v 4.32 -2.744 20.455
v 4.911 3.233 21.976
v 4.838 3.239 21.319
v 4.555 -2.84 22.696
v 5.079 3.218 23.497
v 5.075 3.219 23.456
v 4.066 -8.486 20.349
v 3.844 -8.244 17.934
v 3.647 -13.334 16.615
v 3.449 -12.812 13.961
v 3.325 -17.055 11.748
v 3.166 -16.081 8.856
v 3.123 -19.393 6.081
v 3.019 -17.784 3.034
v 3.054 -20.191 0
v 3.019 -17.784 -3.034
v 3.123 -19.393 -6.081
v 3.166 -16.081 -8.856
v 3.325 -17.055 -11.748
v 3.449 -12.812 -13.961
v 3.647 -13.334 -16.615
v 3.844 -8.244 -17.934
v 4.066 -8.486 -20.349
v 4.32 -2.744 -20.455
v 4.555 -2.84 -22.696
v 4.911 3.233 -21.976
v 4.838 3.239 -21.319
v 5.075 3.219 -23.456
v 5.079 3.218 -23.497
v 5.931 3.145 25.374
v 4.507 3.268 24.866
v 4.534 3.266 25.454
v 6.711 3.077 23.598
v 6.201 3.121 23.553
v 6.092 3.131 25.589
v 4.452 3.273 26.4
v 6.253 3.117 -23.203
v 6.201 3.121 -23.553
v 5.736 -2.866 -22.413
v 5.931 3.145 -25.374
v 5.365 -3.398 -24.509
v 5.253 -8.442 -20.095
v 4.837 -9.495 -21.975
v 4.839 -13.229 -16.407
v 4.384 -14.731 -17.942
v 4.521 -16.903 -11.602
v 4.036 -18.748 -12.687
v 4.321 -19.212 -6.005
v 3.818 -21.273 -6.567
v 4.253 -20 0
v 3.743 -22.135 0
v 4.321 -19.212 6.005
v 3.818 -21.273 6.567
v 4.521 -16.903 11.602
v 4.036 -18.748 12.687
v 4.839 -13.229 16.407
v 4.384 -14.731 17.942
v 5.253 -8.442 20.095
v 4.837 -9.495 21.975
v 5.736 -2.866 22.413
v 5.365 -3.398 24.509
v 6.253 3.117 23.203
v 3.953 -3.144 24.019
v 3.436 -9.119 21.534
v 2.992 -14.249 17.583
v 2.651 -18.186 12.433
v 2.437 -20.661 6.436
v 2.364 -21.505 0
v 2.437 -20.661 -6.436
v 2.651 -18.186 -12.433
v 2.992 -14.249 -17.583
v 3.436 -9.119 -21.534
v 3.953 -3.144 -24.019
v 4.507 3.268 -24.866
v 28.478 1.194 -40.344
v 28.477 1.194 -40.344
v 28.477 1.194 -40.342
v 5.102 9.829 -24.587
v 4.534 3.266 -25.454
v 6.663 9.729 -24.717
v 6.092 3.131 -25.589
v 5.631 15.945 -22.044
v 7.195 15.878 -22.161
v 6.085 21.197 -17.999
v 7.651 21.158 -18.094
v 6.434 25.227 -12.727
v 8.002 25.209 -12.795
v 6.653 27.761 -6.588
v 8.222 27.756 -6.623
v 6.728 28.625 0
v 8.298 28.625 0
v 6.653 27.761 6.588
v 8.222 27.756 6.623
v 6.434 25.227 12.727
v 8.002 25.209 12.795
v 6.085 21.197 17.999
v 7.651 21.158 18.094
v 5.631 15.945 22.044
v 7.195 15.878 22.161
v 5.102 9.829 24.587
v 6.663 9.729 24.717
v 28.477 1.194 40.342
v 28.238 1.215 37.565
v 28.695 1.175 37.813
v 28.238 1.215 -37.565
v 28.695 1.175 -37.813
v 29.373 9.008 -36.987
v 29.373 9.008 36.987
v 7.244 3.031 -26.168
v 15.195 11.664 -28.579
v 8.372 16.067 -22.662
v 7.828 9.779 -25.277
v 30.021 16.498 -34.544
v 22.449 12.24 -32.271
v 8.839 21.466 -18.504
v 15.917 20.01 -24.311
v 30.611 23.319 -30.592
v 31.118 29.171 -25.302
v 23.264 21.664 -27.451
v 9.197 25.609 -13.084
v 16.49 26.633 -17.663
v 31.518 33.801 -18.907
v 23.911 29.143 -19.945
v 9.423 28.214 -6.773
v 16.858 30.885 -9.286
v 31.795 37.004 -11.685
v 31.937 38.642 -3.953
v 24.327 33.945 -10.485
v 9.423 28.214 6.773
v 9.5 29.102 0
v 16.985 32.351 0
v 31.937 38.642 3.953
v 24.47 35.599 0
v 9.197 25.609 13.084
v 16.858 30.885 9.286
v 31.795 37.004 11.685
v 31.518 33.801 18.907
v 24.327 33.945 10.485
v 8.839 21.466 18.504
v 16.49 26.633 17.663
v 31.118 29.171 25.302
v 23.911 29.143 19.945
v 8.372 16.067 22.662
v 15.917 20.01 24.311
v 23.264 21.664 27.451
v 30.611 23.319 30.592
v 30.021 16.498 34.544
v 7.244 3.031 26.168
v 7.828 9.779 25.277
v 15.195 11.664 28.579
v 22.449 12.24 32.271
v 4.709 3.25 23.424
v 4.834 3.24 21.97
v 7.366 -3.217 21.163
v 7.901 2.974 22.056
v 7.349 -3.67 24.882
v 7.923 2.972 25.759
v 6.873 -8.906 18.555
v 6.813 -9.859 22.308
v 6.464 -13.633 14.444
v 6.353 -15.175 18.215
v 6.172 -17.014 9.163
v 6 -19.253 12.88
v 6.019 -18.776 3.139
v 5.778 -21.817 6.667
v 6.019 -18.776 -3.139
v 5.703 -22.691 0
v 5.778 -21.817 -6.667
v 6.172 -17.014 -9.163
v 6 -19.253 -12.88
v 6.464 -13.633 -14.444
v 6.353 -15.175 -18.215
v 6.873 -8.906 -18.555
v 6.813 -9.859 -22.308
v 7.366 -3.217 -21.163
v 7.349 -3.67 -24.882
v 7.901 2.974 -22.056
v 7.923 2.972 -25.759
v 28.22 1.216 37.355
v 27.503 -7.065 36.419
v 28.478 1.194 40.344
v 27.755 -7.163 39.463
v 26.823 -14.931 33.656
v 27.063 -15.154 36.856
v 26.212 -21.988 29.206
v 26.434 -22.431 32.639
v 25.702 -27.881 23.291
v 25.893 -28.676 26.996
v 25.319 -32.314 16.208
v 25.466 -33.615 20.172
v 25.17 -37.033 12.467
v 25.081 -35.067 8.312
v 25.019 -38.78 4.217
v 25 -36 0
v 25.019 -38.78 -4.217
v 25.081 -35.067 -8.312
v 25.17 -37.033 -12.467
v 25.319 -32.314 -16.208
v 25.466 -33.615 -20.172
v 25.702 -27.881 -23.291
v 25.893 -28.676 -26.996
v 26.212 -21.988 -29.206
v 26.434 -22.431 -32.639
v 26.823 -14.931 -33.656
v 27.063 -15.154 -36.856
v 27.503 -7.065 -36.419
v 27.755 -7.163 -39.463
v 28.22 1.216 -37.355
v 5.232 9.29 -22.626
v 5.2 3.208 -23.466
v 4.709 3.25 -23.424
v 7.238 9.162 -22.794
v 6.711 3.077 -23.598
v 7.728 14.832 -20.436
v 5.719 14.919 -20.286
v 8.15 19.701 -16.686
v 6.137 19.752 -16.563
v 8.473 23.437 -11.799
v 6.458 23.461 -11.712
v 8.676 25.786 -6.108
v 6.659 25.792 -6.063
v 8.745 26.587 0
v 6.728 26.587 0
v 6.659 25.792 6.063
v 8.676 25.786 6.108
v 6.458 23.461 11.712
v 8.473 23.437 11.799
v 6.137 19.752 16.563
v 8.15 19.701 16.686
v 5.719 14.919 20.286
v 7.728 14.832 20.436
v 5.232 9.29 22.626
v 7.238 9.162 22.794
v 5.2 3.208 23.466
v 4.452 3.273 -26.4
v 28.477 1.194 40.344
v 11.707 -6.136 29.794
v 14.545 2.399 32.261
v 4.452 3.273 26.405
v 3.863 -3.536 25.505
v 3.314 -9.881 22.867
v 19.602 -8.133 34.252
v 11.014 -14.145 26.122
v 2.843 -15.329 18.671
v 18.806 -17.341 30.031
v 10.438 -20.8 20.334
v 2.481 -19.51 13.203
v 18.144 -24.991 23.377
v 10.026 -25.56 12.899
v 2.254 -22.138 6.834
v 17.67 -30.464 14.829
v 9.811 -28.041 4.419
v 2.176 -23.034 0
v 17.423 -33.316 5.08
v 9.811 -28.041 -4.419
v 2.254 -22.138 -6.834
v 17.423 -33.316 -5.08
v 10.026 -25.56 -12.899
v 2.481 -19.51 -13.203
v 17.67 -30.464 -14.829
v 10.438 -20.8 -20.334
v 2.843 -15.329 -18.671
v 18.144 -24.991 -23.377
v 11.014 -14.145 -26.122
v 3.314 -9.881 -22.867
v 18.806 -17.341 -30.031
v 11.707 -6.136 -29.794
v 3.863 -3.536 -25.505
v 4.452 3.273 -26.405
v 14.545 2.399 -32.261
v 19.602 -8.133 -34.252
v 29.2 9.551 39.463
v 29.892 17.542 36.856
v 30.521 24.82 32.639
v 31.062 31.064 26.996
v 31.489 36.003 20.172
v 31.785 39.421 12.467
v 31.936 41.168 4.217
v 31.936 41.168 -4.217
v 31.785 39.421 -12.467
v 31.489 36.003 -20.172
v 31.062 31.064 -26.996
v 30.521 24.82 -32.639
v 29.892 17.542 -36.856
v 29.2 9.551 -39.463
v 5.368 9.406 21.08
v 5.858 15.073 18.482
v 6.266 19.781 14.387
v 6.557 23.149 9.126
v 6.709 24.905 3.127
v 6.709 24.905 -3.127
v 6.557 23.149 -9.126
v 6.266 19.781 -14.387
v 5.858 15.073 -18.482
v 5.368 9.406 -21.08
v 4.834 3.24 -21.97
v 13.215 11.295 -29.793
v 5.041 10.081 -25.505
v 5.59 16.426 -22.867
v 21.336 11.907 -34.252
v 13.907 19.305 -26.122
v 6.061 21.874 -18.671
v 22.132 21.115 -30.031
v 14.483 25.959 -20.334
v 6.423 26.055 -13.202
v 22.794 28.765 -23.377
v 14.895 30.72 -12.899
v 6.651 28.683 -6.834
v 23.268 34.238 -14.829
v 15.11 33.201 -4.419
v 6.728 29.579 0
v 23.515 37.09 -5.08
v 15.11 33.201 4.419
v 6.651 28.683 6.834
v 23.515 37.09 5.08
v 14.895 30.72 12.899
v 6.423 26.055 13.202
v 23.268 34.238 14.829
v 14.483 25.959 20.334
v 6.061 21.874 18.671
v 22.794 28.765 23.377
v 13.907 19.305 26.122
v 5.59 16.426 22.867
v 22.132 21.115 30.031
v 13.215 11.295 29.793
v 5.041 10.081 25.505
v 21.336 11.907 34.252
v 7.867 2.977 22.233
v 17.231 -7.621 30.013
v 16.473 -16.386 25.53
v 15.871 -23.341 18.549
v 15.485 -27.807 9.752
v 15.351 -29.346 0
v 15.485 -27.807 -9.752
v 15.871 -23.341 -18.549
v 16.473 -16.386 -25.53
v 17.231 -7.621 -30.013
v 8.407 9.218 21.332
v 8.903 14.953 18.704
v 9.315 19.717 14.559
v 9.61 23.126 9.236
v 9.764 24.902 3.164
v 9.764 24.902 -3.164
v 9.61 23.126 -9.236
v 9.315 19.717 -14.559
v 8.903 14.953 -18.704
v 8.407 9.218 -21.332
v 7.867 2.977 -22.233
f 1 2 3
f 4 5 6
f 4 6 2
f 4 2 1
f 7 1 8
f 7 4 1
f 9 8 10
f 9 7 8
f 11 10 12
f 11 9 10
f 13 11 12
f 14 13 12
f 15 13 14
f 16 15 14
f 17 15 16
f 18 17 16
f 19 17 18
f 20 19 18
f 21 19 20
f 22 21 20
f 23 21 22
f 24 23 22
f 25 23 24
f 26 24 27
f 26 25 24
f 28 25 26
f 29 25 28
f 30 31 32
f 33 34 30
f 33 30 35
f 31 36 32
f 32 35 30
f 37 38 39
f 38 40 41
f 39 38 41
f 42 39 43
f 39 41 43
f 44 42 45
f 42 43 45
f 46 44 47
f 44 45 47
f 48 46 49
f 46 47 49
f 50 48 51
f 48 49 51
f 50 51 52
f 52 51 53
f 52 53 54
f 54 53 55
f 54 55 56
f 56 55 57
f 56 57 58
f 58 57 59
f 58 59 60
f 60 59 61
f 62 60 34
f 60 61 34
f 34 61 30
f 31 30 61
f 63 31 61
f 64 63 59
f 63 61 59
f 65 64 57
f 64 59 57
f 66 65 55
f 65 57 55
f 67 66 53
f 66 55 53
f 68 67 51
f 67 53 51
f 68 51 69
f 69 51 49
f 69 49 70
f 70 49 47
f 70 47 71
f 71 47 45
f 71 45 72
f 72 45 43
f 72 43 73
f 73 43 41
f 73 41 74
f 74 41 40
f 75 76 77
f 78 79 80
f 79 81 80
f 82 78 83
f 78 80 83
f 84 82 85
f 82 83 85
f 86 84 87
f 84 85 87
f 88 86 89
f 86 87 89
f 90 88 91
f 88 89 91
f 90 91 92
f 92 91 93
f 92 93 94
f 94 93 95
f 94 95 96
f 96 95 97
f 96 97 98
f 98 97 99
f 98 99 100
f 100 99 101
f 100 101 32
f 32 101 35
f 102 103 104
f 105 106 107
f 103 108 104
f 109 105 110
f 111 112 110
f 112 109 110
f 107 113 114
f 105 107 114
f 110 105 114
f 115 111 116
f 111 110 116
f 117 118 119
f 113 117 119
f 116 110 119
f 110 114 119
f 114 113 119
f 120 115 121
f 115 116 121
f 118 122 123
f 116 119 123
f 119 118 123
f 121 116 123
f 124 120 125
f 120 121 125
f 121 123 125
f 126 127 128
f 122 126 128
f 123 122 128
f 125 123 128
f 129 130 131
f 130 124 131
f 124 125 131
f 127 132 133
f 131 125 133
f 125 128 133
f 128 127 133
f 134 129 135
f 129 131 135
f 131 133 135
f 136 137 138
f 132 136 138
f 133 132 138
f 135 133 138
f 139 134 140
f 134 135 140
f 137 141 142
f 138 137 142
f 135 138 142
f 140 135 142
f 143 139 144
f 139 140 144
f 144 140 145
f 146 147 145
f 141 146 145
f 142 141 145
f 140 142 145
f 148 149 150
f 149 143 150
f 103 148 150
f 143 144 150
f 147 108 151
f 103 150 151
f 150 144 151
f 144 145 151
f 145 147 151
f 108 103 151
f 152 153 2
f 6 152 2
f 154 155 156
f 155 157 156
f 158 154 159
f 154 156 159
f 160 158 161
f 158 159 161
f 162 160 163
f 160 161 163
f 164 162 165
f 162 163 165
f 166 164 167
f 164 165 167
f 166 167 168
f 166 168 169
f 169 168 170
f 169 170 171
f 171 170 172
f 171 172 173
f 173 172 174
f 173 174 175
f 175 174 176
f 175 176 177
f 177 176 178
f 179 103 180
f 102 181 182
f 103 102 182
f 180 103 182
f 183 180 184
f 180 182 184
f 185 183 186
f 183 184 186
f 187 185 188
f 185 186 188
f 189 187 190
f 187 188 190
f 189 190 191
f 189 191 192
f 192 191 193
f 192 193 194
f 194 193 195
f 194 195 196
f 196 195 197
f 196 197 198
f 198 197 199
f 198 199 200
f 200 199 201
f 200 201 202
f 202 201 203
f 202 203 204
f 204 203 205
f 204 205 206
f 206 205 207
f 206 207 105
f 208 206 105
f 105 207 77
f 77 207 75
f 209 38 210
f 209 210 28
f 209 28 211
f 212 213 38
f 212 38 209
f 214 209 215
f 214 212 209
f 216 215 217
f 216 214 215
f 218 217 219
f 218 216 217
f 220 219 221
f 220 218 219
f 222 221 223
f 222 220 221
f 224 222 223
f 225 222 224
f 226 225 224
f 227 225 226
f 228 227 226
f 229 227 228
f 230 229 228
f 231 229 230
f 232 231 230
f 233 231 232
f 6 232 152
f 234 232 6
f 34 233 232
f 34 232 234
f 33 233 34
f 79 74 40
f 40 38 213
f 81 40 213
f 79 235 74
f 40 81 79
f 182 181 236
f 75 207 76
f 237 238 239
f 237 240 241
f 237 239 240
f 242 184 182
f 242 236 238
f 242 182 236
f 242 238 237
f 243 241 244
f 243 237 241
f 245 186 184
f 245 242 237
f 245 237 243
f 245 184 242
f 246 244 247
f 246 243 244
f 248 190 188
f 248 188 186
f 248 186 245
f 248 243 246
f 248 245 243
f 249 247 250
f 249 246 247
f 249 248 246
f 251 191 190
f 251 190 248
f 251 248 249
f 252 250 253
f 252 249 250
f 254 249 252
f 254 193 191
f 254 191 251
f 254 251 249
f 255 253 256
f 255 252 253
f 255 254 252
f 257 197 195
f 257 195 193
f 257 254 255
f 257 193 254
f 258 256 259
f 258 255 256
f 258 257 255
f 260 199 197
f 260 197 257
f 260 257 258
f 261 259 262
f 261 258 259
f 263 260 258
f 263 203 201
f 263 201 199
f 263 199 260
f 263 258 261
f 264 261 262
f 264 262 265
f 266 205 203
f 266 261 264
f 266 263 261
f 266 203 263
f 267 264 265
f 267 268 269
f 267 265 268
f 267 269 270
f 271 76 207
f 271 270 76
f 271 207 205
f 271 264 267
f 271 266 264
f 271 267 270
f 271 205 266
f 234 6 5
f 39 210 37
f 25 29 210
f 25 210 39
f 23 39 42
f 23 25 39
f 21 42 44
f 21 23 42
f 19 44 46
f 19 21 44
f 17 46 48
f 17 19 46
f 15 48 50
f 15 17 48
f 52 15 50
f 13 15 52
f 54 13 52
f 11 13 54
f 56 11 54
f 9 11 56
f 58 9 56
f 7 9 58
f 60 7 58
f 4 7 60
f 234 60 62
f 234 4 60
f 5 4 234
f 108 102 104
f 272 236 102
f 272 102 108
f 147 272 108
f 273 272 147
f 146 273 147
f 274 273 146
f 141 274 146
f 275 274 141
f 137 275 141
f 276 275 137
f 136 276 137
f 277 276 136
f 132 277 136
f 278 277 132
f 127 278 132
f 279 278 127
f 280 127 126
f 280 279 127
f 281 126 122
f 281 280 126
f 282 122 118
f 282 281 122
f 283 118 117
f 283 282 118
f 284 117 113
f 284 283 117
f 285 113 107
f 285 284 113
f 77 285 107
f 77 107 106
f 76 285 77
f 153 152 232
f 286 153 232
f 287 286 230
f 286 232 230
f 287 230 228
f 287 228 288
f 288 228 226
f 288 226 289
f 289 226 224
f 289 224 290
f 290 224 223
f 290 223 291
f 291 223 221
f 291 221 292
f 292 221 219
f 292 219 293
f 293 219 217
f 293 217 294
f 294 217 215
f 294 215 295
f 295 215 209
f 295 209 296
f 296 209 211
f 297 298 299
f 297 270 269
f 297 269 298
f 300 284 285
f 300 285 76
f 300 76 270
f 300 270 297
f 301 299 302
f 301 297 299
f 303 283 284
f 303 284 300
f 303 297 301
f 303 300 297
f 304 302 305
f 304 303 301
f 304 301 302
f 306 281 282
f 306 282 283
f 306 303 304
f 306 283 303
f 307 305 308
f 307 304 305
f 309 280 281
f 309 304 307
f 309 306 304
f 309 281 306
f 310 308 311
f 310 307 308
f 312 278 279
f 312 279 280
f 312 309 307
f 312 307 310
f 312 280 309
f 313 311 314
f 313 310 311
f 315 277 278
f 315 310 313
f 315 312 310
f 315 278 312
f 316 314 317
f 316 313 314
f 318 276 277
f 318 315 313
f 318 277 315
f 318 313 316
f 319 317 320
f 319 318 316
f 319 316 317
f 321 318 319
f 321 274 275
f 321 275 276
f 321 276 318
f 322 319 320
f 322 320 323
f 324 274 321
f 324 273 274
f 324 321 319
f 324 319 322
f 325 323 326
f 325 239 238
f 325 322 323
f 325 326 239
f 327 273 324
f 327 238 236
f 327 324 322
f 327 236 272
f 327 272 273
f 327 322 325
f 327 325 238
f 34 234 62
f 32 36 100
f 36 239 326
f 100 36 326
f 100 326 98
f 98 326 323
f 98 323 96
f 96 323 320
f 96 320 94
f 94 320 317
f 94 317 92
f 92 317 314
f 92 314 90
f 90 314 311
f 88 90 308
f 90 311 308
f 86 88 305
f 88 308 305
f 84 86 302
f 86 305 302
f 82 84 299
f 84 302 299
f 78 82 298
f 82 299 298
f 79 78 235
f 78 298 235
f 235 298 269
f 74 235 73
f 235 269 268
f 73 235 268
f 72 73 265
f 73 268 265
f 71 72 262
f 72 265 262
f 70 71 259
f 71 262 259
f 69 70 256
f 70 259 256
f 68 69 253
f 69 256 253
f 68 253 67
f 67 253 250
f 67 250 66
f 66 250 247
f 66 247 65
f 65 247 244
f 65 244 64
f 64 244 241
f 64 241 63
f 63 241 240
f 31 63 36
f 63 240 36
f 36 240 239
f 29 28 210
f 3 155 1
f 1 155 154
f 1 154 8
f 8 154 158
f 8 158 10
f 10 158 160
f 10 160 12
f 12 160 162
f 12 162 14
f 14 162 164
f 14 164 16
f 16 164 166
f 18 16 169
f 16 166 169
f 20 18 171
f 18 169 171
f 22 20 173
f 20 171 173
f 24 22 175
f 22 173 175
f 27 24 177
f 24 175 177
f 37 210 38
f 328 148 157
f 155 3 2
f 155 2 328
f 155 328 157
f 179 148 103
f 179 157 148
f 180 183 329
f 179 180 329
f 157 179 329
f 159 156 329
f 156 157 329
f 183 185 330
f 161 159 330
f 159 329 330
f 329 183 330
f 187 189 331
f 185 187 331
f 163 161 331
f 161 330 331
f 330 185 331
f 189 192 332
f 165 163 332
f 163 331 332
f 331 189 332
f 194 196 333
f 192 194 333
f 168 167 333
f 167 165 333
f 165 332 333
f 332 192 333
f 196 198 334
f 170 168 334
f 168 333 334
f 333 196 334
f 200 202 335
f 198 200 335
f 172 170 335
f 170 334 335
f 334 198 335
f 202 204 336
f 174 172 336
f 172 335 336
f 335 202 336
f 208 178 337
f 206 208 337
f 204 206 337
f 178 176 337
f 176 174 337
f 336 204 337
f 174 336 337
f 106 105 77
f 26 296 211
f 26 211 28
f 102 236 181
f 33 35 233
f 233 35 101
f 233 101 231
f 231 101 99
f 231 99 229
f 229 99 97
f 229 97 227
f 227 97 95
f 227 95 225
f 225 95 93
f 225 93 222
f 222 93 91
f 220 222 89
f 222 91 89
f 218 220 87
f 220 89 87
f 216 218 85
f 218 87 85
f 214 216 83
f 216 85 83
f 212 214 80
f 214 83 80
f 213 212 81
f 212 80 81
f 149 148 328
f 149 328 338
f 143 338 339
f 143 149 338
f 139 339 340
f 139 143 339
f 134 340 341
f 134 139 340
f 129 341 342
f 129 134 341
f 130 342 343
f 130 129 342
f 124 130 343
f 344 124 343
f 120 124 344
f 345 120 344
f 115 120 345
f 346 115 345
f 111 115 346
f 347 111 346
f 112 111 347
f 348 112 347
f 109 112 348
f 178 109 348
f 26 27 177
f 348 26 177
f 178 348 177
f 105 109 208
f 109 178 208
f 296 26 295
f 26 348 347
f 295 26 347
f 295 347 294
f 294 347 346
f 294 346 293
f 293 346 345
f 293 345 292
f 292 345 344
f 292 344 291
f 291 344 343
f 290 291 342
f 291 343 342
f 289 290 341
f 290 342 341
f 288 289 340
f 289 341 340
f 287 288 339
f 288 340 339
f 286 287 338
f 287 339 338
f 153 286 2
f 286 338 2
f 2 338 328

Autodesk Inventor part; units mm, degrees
ref_plane "YZ Plane" through (0, 0, 0) normal (1, 0, 0) x (0, 1, 0)
ref_plane "XZ Plane" through (0, 0, 0) normal (0, 1, 0) x (-1, 0, 0)
ref_plane "XY Plane" through (0, 0, 0) normal (0, 0, 1) x (1, 0, 0)
sketch "Sketch1" plane through (0, 0, 0) normal (1, 0, 0) x (0, 1, 0)
  arc A0 (6, 5) -> (0, 6.4776) centre (1.5083, -0.3184) ccw
  arc A1 (0, 6.4776) -> (-6, 2) centre (-0.0372, 0.2686) ccw
  arc A2 (-6, 2) -> (-5, -3.4628) centre (-1.5043, 0) ccw
  arc A3 (-5, -3.4628) -> (2, -5.5969) centre (1.6627, 5.8444) ccw
  arc A4 (2, -5.5969) -> (6.9353, -3.4628) centre (1.5482, 2.2219) ccw
  arc A5 (6, 5) -> (13, 1) centre (22.0402, 24.9454) ccw
  arc A6 (13, -1) -> (6.9353, -3.4628) centre (16.5953, -18.5517) ccw
  arc A7 (13, -1) -> (13, 1) centre (11.912, 0) ccw
  arc A8 (15.1251, -1.2068) -> (15.1251, 1.1192) centre (13.8597, -0.0438) ccw
  arc A9 (6.9841, 5.7712) -> (15.1251, 1.1192) centre (25.6388, 28.9677) ccw
  arc A10 (6.9841, 5.7712) -> (0.0061, 7.4897) centre (1.7602, -0.414) ccw
  arc A11 (0.0061, 7.4897) -> (-6.9719, 2.2822) centre (-0.0372, 0.2686) ccw
  arc A12 (-6.9719, 2.2822) -> (-5.8089, -4.0711) centre (-1.7435, -0.0438) ccw
  arc A13 (-5.8089, -4.0711) -> (2.3321, -6.5529) centre (1.9397, 6.7532) ccw
  arc A14 (2.3321, -6.5529) -> (8.0718, -4.0711) centre (1.8067, 2.5403) ccw
  arc A15 (15.1251, -1.2068) -> (8.0718, -4.0711) centre (19.3063, -21.6193) ccw
  point P0 (0, 0)
sketch "Sketch2" plane through (0, 0, 0) normal (0, 0, 1) x (1, 0, 0)
  arc A0 (4.5893, 15.6275) -> (5.3653, 12.7341) centre (8.4769, 15.1194) ccw
  arc A1 (7.1334, 6.0475) -> (5.3653, 12.7341) centre (-9.3019, 5.2787) ccw
  arc A2 (4, -1) -> (7.1334, 6.0475) centre (-2.3212, 6.0308) ccw
  arc A3 (4, -1) -> (2.2783, -7.605) centre (15.174, -7.4395) ccw
  arc A4 (4.5893, 15.6275) -> (-5.4042, 15.6275) centre (-0.4074, 13.9881) ccw
  arc A5 (-4.7137, -7.4395) -> (2.2783, -7.605) centre (-1.0169, 0.9638) ccw
  arc A6 (-5.4042, 15.6275) -> (-4.7137, -7.4395) centre (15.8945, 4.7212) ccw
  point P0 (0, 0)
  point P1 (16.0644, 6.0537)
sketch "Sketch3" plane through (0, 0, 0) normal (0, 0, 1) x (1, 0, 0)
  line L0 (8, 6) -> (8, -9.7213)
  line L1 (8, 6) -> (8, 19.0901)
  arc A0 (8, -9.7213) -> (8, 19.0901) centre (-3.1204, 4.6844) ccw
  point P0 (0, 0)
sketch "Sketch4" plane through (0, 0, 0) normal (0, 0, 1) x (1, 0, 0)
  arc A0 (4, -3) -> (3, -7.466) centre (10.199, -6.733) ccw
  arc A1 (4, -3) -> (7.6292, 3.7812) centre (-12.6955, 10.297) ccw
  arc A2 (7.6292, 3.7812) -> (7, 11) centre (-7.2238, 6.1234) ccw
  arc A3 (7, 11) -> (6.1482, 13) centre (-7.2238, 6.1234) ccw
  arc A4 (5.3976, 15.5783) -> (6.1482, 13) centre (8.6756, 15.1342) ccw
  arc A5 (3, -7.466) -> (9, -9) centre (8, -0.4104) ccw
  arc A6 (11, 18) -> (5.3976, 15.5783) centre (10.5, 11.4654) ccw
  arc A7 (9, -9) -> (11, 18) centre (-69.2967, 10.3738) ccw
  point P0 (0, 0)
sketch "Sketch5" plane through (0, 0, 0) normal (1, 0, 0) x (0, 1, 0)
  arc A0 (13, -1.7602) -> (13, 2.0171) centre (12.6189, 0.1284) ccw
  arc A1 (17, 0) -> (13, 2.0171) centre (12.9569, -3.0431) ccw
  arc A2 (13, -1.7602) -> (17, 0) centre (13.7728, 1.9087) ccw
  point P0 (0, 0)
sketch "Sketch7" plane through (0, 0, 0) normal (1, 0, 0) x (0, 1, 0)
  circle A0 centre (5, 0.3375) radius 25
  point P0 (0, 0)
  dimension "d10" = 50
sketch "Sketch8" plane through (0, 0, 0) normal (0, 0, 1) x (1, 0, 0)
  arc A0 (4.5893, 15.6275) -> (5.3653, 12.7341) centre (8.4769, 15.1194) ccw
  arc A1 (7.1334, 6.0475) -> (5.3653, 12.7341) centre (-9.3019, 5.2787) ccw
  arc A2 (4, -1) -> (7.1334, 6.0475) centre (-2.3212, 6.0308) ccw
  arc A3 (4, -1) -> (2.2783, -7.605) centre (15.174, -7.4395) ccw
  arc A4 (4.5893, 15.6275) -> (-5.4042, 15.6275) centre (-0.4074, 13.9881) ccw
  arc A5 (-4.7137, -7.4395) -> (2.2783, -7.605) centre (-1.0169, 0.9638) ccw
  arc A6 (-5.4042, 15.6275) -> (-4.7137, -7.4395) centre (15.8945, 4.7212) ccw
  point P0 (0, 0)
sketch "Sketch9" plane through (0, 0, 0) normal (0, 0, 1) x (1, 0, 0)
  line L0 (2.2936, -15.8564) -> (2.2936, -6.8564)
  arc A0 (2.2936, -6.8564) -> (-3.9962, -9.9765) centre (0.2723, -10.6815) ccw
  arc A1 (-4, -16) -> (2.2936, -15.8564) centre (-0.9465, -11.8394) ccw
  arc A2 (-3.9962, -9.9765) -> (-4, -16) centre (14.3076, -12.9998) ccw
  point P0 (0, 0)
sketch "Sketch10" plane through (0, 0, 0) normal (1, 0, 0) x (0, 1, 0)
  arc A0 (13, -1) -> (13, 1) centre (11.912, 0) ccw
  arc A1 (6, 5) -> (13, 1) centre (22.0402, 24.9454) ccw
  arc A2 (6, 5) -> (0, 6.4776) centre (1.5083, -0.3184) ccw
  arc A3 (0, 6.4776) -> (-6, 2) centre (-0.0372, 0.2686) ccw
  arc A4 (-6, 2) -> (-5, -3.4628) centre (-1.5043, 0) ccw
  arc A5 (-5, -3.4628) -> (2, -5.5969) centre (1.6627, 5.8444) ccw
  arc A6 (2, -5.5969) -> (6.9353, -3.4628) centre (1.5482, 2.2219) ccw
  arc A7 (13, -1) -> (6.9353, -3.4628) centre (16.5953, -18.5517) ccw
  point P0 (0, 0)
sketch "Sketch11" plane through (0, 0, 0) normal (0, 0, 1) x (1, 0, 0)
  arc A0 (4, -3) -> (3, -7.466) centre (10.199, -6.733) ccw
  arc A1 (4, -3) -> (7.6292, 3.7812) centre (-12.6955, 10.297) ccw
  arc A2 (7.6292, 3.7812) -> (7, 11) centre (-7.2238, 6.1234) ccw
  arc A3 (7, 11) -> (6.1482, 13) centre (-7.2238, 6.1234) ccw
  arc A4 (5.3976, 15.5783) -> (6.1482, 13) centre (8.6756, 15.1342) ccw
  arc A5 (11, -15) -> (11, 18) centre (-58.5, 1.5) ccw
  arc A6 (3, -7.466) -> (3.1376, -15) centre (85.1776, -9.733) ccw
  arc A7 (6, 24) -> (5.3976, 15.5783) centre (36.0186, 17.6203) ccw
  arc A8 (11, 18) -> (6, 24) centre (2.7033, 16.1694) ccw
  arc A9 (3.1376, -15) -> (11, -15) centre (7.0688, -10.5838) ccw
  arc A10 (5, 24) -> (4.5969, 15.5783) centre (45.756, 17.829) ccw
  arc A11 (-2, 19) -> (4.5969, 15.5783) centre (5.6189, 25.6189) ccw
  arc A12 (5, 24) -> (-2, 19) centre (11.5, 7.5) ccw
  point P0 (0, 0)
sketch "Sketch12" plane through (0, 0, 0) normal (1, 0, 0) x (0, 1, 0)
  circle A0 centre (3, 0.2318) radius 20
  circle A1 centre (3, 0.2318) radius 19
  point P0 (0, 0)
  dimension "d21" = 40
  dimension "d22" = 38
sketch "Sketch13" plane through (0, 0, 0) normal (0, 0, 1) x (1, 0, 0)
  arc A0 (4.6444, -3) -> (3.6444, -7.466) centre (10.8434, -6.733) ccw
  arc A1 (4.6444, -3) -> (8.2736, 3.7812) centre (-12.0511, 10.297) ccw
  arc A2 (8.2736, 3.7812) -> (7.6444, 11) centre (-6.5793, 6.1234) ccw
  arc A3 (7.6444, 11) -> (6.7926, 13) centre (-6.5793, 6.1234) ccw
  arc A4 (6.042, 15.5783) -> (6.7926, 13) centre (9.3201, 15.1342) ccw
  arc A5 (12.1446, -13.3563) -> (11.6094, 18.8213) centre (-67.1488, 1.418) ccw
  arc A6 (4.5893, 15.6275) -> (5.3653, 12.7341) centre (8.4769, 15.1194) ccw
  arc A7 (7.1334, 6.0475) -> (5.3653, 12.7341) centre (-9.3019, 5.2787) ccw
  arc A8 (4, -1) -> (7.1334, 6.0475) centre (-2.3212, 6.0308) ccw
  arc A9 (4, -1) -> (2.2783, -7.605) centre (15.174, -7.4395) ccw
  arc A10 (-5.4042, 15.6275) -> (-4.7137, -7.4395) centre (15.8945, 4.7212) ccw
  arc A11 (3.6444, -7.466) -> (4.6444, -19) centre (48.1921, -9.4141) ccw
  arc A12 (1, -17) -> (2.2783, -7.605) centre (-20.1318, -9.3402) ccw
  arc A13 (4.5893, 15.6275) -> (4, 28) centre (-90.183, 17.3138) ccw
  arc A14 (6.0097, 28) -> (6.042, 15.5783) centre (472.3708, 23) ccw
  arc A15 (4.6444, -19) -> (12.1446, -13.3563) centre (5.8088, -12.7419) ccw
  arc A16 (11.6094, 18.8213) -> (6.0097, 28) centre (-7.4499, 13.4913) ccw
  arc A17 (-4.7137, -7.4395) -> (1, -17) centre (32.2099, 8.14) ccw
  arc A18 (4, 28) -> (-5.4042, 15.6275) centre (39.2165, -8.5279) ccw
  point P0 (0, 0)
sketch "Sketch16" plane through (0, 0, 0) normal (0, 0, 1) x (1, 0, 0)
  arc A0 (7.7852, 10.9763) -> (6.9451, 12.9812) centre (-6.467, 6.1832) ccw
  arc A1 (8.372, 3.7539) -> (7.7852, 10.9763) centre (-6.467, 6.1832) ccw
  arc A2 (4.7031, -3.0059) -> (8.372, 3.7539) centre (-11.9141, 10.3888) ccw
  arc A3 (4.7031, -3.0059) -> (3.6769, -7.4659) centre (10.88, -6.7752) ccw
  arc A4 (6.2096, 15.5639) -> (6.9451, 12.9812) centre (9.485, 15.1006) ccw
  line L0 (3.6769, -7.4659) -> (3.6769, -13)
  line L1 (3.6769, -13) -> (8.7312, -13)
  line L2 (7.1813, -23) -> (8.45, -23) projected
  line L3 (6.2096, 15.5639) -> (6.0634, 19)
  line L4 (6.0634, 19) -> (8.7312, 19)
  line L5 (8.7312, 19) -> (8.7312, -13)
  point P0 (0, 0)
sketch "Sketch18" plane through (0, 0, 0) normal (0, 1, 0) x (-1, 0, 0)
  arc A0 (0, 16) -> (0, -16) centre (63, 0) ccw
  arc A1 (0, -16) -> (0, 16) centre (-1, 0) ccw
  point P0 (0, 0)
sketch "Sketch19" plane through (0, 0, 0) normal (0, 0, 1) x (1, 0, 0)
  arc A0 (0, -13) -> (0, 21.2939) centre (-44.6367, 4.1469) ccw
  arc A1 (0, 21.2939) -> (0, -13) centre (9.2646, 4.1469) ccw
  point P0 (0, 0)
sketch "Sketch20" plane through (0, 0, 0) normal (0, 1, 0) x (-1, 0, 0)
  arc A0 (0, 18) -> (0, -21) centre (116.9496, -1.5) ccw
  arc A1 (0, -21) -> (0, 18) centre (-188.5, -1.5) ccw
  point P0 (0, 0)
sketch "Sketch21" plane through (0, 0, 0) normal (0, 0, 1) x (1, 0, 0)
  arc A0 (4.5893, 15.6275) -> (5.3653, 12.7341) centre (8.4769, 15.1194) ccw
  arc A1 (7.1334, 6.0475) -> (5.3653, 12.7341) centre (-9.3019, 5.2787) ccw
  arc A2 (4, -1) -> (7.1334, 6.0475) centre (-2.3212, 6.0308) ccw
  arc A3 (4, -1) -> (2.2783, -7.605) centre (15.174, -7.4395) ccw
  arc A4 (-5.4042, 15.6275) -> (-4.7137, -7.4395) centre (15.8945, 4.7212) ccw
  arc A5 (1.6146, -47) -> (2.2783, -7.605) centre (-871.3055, -12.5889) ccw
  arc A6 (-4.7137, -7.4395) -> (1.6146, -47) centre (3.6662, -26.3854) ccw
  arc A7 (6.6047, 48.2766) -> (4.5893, 15.6275) centre (207.8183, 19.4692) ccw
  arc A8 (6.6047, 48.2766) -> (-5.4042, 15.6275) centre (18.1068, 25.5128) ccw
  point P0 (4.9602, 0)
sketch "Sketch22" plane through (0, 0, 0) normal (1, 0, 0) x (0, 1, 0)
  arc A0 (12.671, -1.508) -> (10.1452, -2.4415) centre (13.2273, -6.897) ccw
  arc A1 (5.972, -5.9193) -> (10.1452, -2.4415) centre (1.4729, 3.7221) ccw
  arc A2 (-1.0034, -7.134) -> (5.972, -5.9193) centre (0.0411, 7.5036) ccw
  arc A3 (-6.1623, -3.0965) -> (-1.0034, -7.134) centre (-0.5861, -1.2862) ccw
  arc A4 (-5.468, 3.7221) -> (-6.1623, -3.0965) centre (0.6002, -0.3405) ccw
  arc A5 (6.5632, 5.6579) -> (-0.5861, 6.5886) centre (1.6095, -4.4698) ccw
  arc A6 (-0.5861, 6.5886) -> (-5.468, 3.7221) centre (0, 0) ccw
  arc A7 (6.5632, 5.6579) -> (11.3492, 2.8919) centre (22.0985, 27.015) ccw
  arc A8 (14.2401, 1.3463) -> (11.3492, 2.8919) centre (11.1023, -1.0462) ccw
  arc A9 (13.4173, -1.2862) -> (14.2401, 1.3463) centre (12.4465, 0.462) ccw
  arc A10 (12.671, -1.508) -> (13.4173, -1.2862) centre (12.7302, -0.341) ccw
  point P0 (0, 0)
  point P1 (20.1069, -9.3097)
sketch "Sketch23" plane through (0, 0, 0) normal (0, 0, 1) x (1, 0, 0)
  arc A0 (4, -3) -> (3, -7.466) centre (10.199, -6.733) ccw
  arc A1 (4, -3) -> (7.6292, 3.7812) centre (-12.6955, 10.297) ccw
  arc A2 (7.6292, 3.7812) -> (7, 11) centre (-7.2238, 6.1234) ccw
  arc A3 (7, 11) -> (6.1482, 13) centre (-7.2238, 6.1234) ccw
  arc A4 (5.3976, 15.5783) -> (6.1482, 13) centre (8.6756, 15.1342) ccw
  arc A5 (3, -7.466) -> (12.0039, -34.009) centre (74.5087, 1.9925) ccw
  arc A6 (12.0039, -34.009) -> (12.0039, 40.009) centre (-50.8687, 3) ccw
  arc A7 (12.0039, 40.009) -> (5.3976, 15.5783) centre (75.5489, 9.7171) ccw
  point P0 (0, 0)
sketch "Sketch24" plane through (0, 0, 0) normal (1, 0, 0) x (0, 1, 0)
  circle A0 centre (4, 0) radius 24.0208
  circle A1 centre (4, 0) radius 54.037
  point P0 (0, 0)
sketch "Sketch25" plane through (0, 0, 0) normal (0, 0, 1) x (1, 0, 0)
  line L0 (2.9628, -6.7024) -> (3, -28)
  arc A0 (7, 36) -> (4.5756, 19.3965) centre (118.9772, 11.1705) ccw
  arc A1 (5.9839, 23.9235) -> (5.3976, 15.5783) centre (44.4323, 17.0293) ccw
  arc A2 (5.9839, 23.9235) -> (7, 33) centre (-89.9402, 39.2578) ccw
  arc A3 (5.3976, 15.5783) -> (7, 33) centre (-0.8843, 24.9407) ccw
  arc A4 (7, 36) -> (4.5756, 19.3965) centre (13.0884, 26.6322) ccw
  arc A5 (3, -28) -> (2.9628, -6.7024) centre (-3.3961, -17.3623) ccw
  point P0 (0, 0)
sketch "Sketch31" plane through (0, 0, 0) normal (1, 0, 0) x (0, 1, 0)
  circle A0 centre (4.1775, 0) radius 24.15
  circle A1 centre (4.1775, 0) radius 23
  point P0 (0, 0)
  dimension "d65" = 46
  dimension "d66" = 48.3
sketch "Sketch32" plane through (0, 0, 0) normal (0, 0, 1) x (1, 0, 0)
  arc A0 (4, -1) -> (2.2783, -7.605) centre (15.174, -7.4395) ccw
  arc A1 (4, -1) -> (7.1334, 6.0475) centre (-2.3212, 6.0308) ccw
  arc A2 (7.1334, 6.0475) -> (5.3653, 12.7341) centre (-9.3019, 5.2787) ccw
  arc A3 (4.5893, 15.6275) -> (5.3653, 12.7341) centre (8.4769, 15.1194) ccw
  arc A4 (-5.4042, 15.6275) -> (-4.7137, -7.4395) centre (15.8945, 4.7212) ccw
  arc A5 (1.6146, -47) -> (2.2783, -7.605) centre (-871.3055, -12.5889) ccw
  arc A6 (-4.7137, -7.4395) -> (1.6146, -47) centre (3.6662, -26.3854) ccw
  arc A7 (6.6047, 48.2766) -> (4.5893, 15.6275) centre (207.8183, 19.4692) ccw
  arc A8 (6.6047, 48.2766) -> (-5.4042, 15.6275) centre (18.1068, 25.5128) ccw
  point P0 (0, 0)
sketch "Sketch34" plane through (0, 0, 0) normal (0, 0, 1) x (1, 0, 0)
  arc A0 (5, -4) -> (9, 6) centre (-7, 6.6) ccw
  arc A1 (5, -4) -> (4, -8) centre (10.5, -7.5) ccw
  arc A2 (4, -19.9725) -> (4, -8) centre (-95.2669, -13.9862) ccw
  arc A3 (9, 6) -> (6.6308, 15) centre (-16.4523, 4.1118) ccw
  line L0 (6.6308, 15) -> (6.6308, 28.2457)
  arc A4 (4, -19.9725) -> (6.6308, 28.2457) centre (64.4177, 0.9119) ccw
  point P0 (0, 0)
sketch "Sketch35" plane through (0, 0, 0) normal (0, 0, 1) x (1, 0, 0)
  arc A0 (12, -8) -> (-7, -11) centre (15.0455, -88.9545) ccw
  arc A1 (-7, -11) -> (12, -8) centre (3.194, -13.8955) ccw
  point P0 (0, 0)
ref_plane "Work Plane16" through (6.6308, 4.1775, 0) normal (1, 0, 0) x (0, 0, -1)
sketch "Sketch36" plane through (6.6308, 4.1775, 0) normal (1, 0, 0) x (0, 0, -1)
  arc A0 (21.5893, 10.8225) -> (-21.5893, 10.8225) centre (0, -0.149) ccw
  arc A1 (20.2947, 10.8225) -> (-20.2947, 10.8225) centre (0, 0) ccw
  line L0 (-21.5893, 10.8225) -> (-20.2947, 10.8225)
  line L1 (-21.5893, 10.8225) -> (-20.2947, 10.8225)
  line L2 (20.2947, 10.8225) -> (21.5893, 10.8225)
  point P0 (0, -4.1775)
sketch "Sketch37" plane through (0, 0, 0) normal (1, 0, 0) x (0, 1, 0)
  arc A0 (15, 20.2947) -> (6, 22.9277) centre (4.1775, 0) ccw
  arc A1 (15, 21.5893) -> (6, 24.0811) centre (4.9955, 2.9543) ccw
  line L0 (15, 21.5893) -> (15, 20.2947)
  line L1 (15, 21.5893) -> (15, 20.2947)
  line L2 (6, 22.9277) -> (6, 24.0811)
  line L3 (6, 24.0811) -> (6, 22.9277)
  line L4 (15, -20.2947) -> (15, -21.5893) projected
  line L5 (15, -21.5351) -> (15, -20.2947)
  arc A2 (6, -24.0811) -> (15, -21.5893) centre (4.3914, -0.7727) ccw
  arc A3 (6, -22.9277) -> (15, -20.2947) centre (4.1775, 0) ccw
  line L6 (6, -24.0811) -> (6, -22.9277) projected
  line L7 (6, -24.0811) -> (6, -22.9277)
  point P0 (0, 0)
sketch "Sketch38" plane through (0, 0, 0) normal (0, 0, 1) x (1, 0, 0)
  arc A0 (7.1334, 6) -> (5.3972, 12.671) centre (-9.2641, 5.2939) ccw
  arc A1 (4.5581, 15) -> (5.3972, 12.671) centre (8.676, 15.1681) ccw
  line L0 (0, 15) -> (4.5581, 15) projected
  line L1 (0, 6) -> (7.1334, 6) projected
  arc A2 (4.5581, 15) -> (7.1334, 6) centre (1.4649, 9.2464) ccw
  point P0 (0, 0)
  point P1 (6.4152, 10.1452)
  point P2 (4.945, 13.4173)
sketch "Sketch39" plane through (0, 0, 0) normal (0, 0, 1) x (1, 0, 0)
  arc A0 (9, 6) -> (11.63, 15) centre (12.0023, 10.0069) ccw
  arc A1 (9, 6) -> (11.63, 15) centre (-3.4729, 14.5291) ccw
  point P0 (0, 0)
sketch "Sketch40" plane through (0, 0, 0) normal (0, 0, 1) x (1, 0, 0)
  arc A0 (1, -11) -> (5, -7) centre (4.0607, -10.0607) ccw
  arc A1 (5, -7) -> (1, -11) centre (6.5, -12.5) ccw
  point P0 (0, 0)
  point P1 (2.963, -6.7889)
sketch "Sketch41" plane through (0, 0, 0) normal (0, 0, 1) x (1, 0, 0)
  line L0 (26.7844, 11.2115) -> (14, 17)
  line L1 (14, 17) -> (1.6259, -10.3292)
  line L2 (1.6259, -10.3292) -> (14.4104, -16.1177)
  line L3 (14.4104, -16.1177) -> (26.7844, 11.2115)
  point P0 (0, 0)
  dimension "d87" = 30
ref_plane "Work Plane13" through (2.4677, -8.47, 20.5733) normal (0.911, -0.4125, 0) x (0, 0, -1)
sketch "Sketch43" plane through (2.4677, -8.47, 20.5733) normal (0.911, -0.4125, 0) x (0, 0, -1)
  line L0 (-2.3543, 15.8761) -> (-3.5078, 15.8761)
  line L1 (-3.5078, 15.8761) -> (-2.3543, 15.8761)
  arc A0 (-3.5078, 15.8761) -> (0.1198, -0.2516) centre (25.1927, 13.8599) ccw
  line L2 (1.4913, -0.2516) -> (0.1198, -0.2516)
  line L3 (0.1198, -0.2516) -> (1.4913, -0.2516)
  line L4 (-1.278, 5.6151) -> (14.6782, 5.6151) projected
  arc A1 (-2.3543, 15.8761) -> (1.4913, -0.2516) centre (22.6187, 13.3086) ccw
  point P0 (20.5733, 6.6981)
  point P1 (1.4551, -0.1819)
ref_plane "Work Plane14" through (2.964, -7.3739, 19.8888) normal (0.911, -0.4125, 0) x (0, 0, -1)
sketch "Sketch45" plane through (2.964, -7.3739, 19.8888) normal (0.911, -0.4125, 0) x (0, 0, -1)
  line L0 (43.9735, 14.6294) -> (42.8127, 14.6294)
  line L1 (42.8202, 14.6294) -> (43.9735, 14.6294) projected
  arc A0 (40.3423, -1.4549) -> (43.9735, 14.6294) centre (15.2518, 12.6615) ccw
  arc A1 (39, -1.4549) -> (42.8202, 14.6294) centre (15.5968, 12.5994) ccw
  line L2 (40.3423, -1.4549) -> (38.9708, -1.4549)
  line L3 (38.9708, -1.4549) -> (40.3423, -1.4549)
  point P0 (19.8888, 5.4949)
sketch "Sketch46" plane through (0, 0, 0) normal (0, 0, 1) x (1, 0, 0)
  arc A0 (8.9982, -11.6413) -> (8.9982, 28.2457) centre (46.0154, 8.3022) ccw
  line L0 (8.9982, 28.2457) -> (8.9982, -11.6413)
  point P0 (0, 0)
sketch "Sketch47" plane through (0, 0, 0) normal (0, 0, 1) x (1, 0, 0)
  line L0 (13.5135, 0) -> (-7.3337, 0)
  line L1 (2.3639, -20.2737) -> (9.0424, -23.2975) construction
  line L2 (2.3639, -20.2737) -> (9.0424, -23.2975)
  line L3 (9.0424, -23.2975) -> (9.0424, -24.2545)
  line L4 (9.0424, -24.2545) -> (2.3639, -21.2074)
  line L5 (2.3639, -21.2074) -> (2.3639, -20.2737)
  point P0 (0, 0)
sketch "Sketch48" plane through (0, 0, 0) normal (1, 0, 0) x (0, 1, 0)
  line L0 (-7.605, -19.7528) -> (-7.605, 19.6257)
  arc A0 (-7.605, 19.6257) -> (-7.605, -19.7528) centre (1.069, -0.0635) ccw
  point P0 (0, 0)
sketch "Sketch49" plane through (0, 0, 0) normal (0, 0, 1) x (1, 0, 0)
  line L0 (2.2936, -7.605) -> (2.2936, -6.8564) projected
  line L1 (2.2936, -6.8564) -> (2.2936, -25.2348)
  arc A0 (2.2936, -6.8564) -> (2.2936, -25.2348) centre (2.131, -16.0456) ccw
  point P0 (0, 0)
sketch "Sketch50" plane through (0, 0, 0) normal (0, 0, 1) x (1, 0, 0)
  arc A0 (3.3209, -23.1081) -> (8.9982, 5.953) centre (-195.8612, 30.8887) ccw
  arc A1 (3.3209, -23.1081) -> (3, 48) centre (19.245, 12.5186) ccw
  arc A2 (3, 48) -> (8, 28.2457) centre (151.9378, 75.1876) ccw
  line L0 (8.9982, -11.6413) -> (8.9982, 5.953) projected
  arc A3 (8.9982, 5.953) -> (8, 28.2457) centre (-139.412, 10.4765) ccw
  point P0 (0, 0)
  point P1 (8.9982, 6)
sketch "Sketch52" plane through (0, 0, 0) normal (1, 0, 0) x (0, 1, 0)
  line L0 (32, 0) -> (-26, 0)
  arc A0 (32, 0) -> (-26, 0) centre (3, 2.0806) ccw
  point P0 (0, 0)
sketch "Sketch53" plane through (0, 0, 0) normal (1, 0, 0) x (0, 1, 0)
  arc A0 (13, -1.4779) -> (13, 1.4779) centre (12.9444, 0) ccw
  arc A1 (13, 1.4779) -> (13, -1.4779) centre (15.3831, 0) ccw
  point P0 (0, 0)
sketch "Sketch55" plane through (0, 0, 0) normal (0, 0, 1) x (1, 0, 0)
  arc A0 (4.58, 19.7001) -> (6, 11) centre (32.9729, 19.8682) ccw
  arc A1 (4.58, 19.7001) -> (6, 11) centre (11.8372, 16.4186) ccw
  point P0 (0, 0)
ref_plane "Work Plane5" through (0, 0, 15) normal (0, 0, 1) x (1, 0, 0)
sketch "Sketch56" plane through (0, 0, 15) normal (0, 0, 1) x (1, 0, 0)
  arc A0 (6.4152, 10.1452) -> (4, 25) centre (-21.1275, 13.2908) ccw
  arc A1 (4, 25) -> (6.4152, 10.1452) centre (20.5376, 20.0651) ccw
  point P0 (0, 0)
ref_plane "Work Plane3" through (0, 0, 0) normal (0, 0, 1) x (1, 0, 0)
ref_plane "Work Plane6" through (0, 0, -15) normal (0, 0, 1) x (1, 0, 0)
sketch "Sketch57" plane through (0, 0, -15) normal (0, 0, 1) x (1, 0, 0)
  arc A0 (5.512, 20.9612) -> (4.7992, 23.1043) centre (-21.1275, 13.2908) ccw projected
  arc A1 (6.4152, 10.1452) -> (4.7992, 23.1043) centre (-21.1275, 13.2908) ccw
  arc A2 (4.7992, 23.1043) -> (6.4152, 10.1452) centre (4.6042, 16.4997) ccw
  point P0 (0, 0)
ref_plane "Work Plane7" through (0, 0, -15) normal (0, 0, 1) x (1, 0, 0)
sketch "Sketch58" plane through (0, 0, -15) normal (0, 0, 1) x (1, 0, 0)
  arc A0 (4.5821, 19.4868) -> (4.7951, 33.432) centre (-39.5171, 27.1347) ccw
  arc A1 (4.5821, 19.4868) -> (5.6499, 12.1459) centre (32.9729, 19.8682) ccw
  arc A2 (4.7951, 33.432) -> (5.6499, 12.1459) centre (19.8894, 23.3779) ccw
  point P0 (0, 0)
ref_plane "Work Plane8" through (0, 0, -15) normal (0, 0, 1) x (1, 0, 0)
sketch "Sketch59" plane through (0, 0, -15) normal (0, 0, 1) x (1, 0, 0)
  arc A0 (4.5821, 19.4868) -> (4.7951, 33.432) centre (-39.5171, 27.1347) ccw
  arc A1 (4.5821, 19.4868) -> (5.6499, 12.1459) centre (32.9729, 19.8682) ccw
  arc A2 (4.7951, 33.432) -> (5.6499, 12.1459) centre (19.8894, 23.3779) ccw
  point P0 (0, 0)
sketch "Sketch60" plane through (0, 0, 0) normal (1, 0, 0) x (0, 1, 0)
  line L0 (12.1111, 15) -> (12.1111, 21.5884)
  line L1 (12.1111, 21.5884) -> (12.1111, 15)
  line L2 (20.9612, 15.726) -> (20.9612, 15) projected
  line L3 (20.9612, 15) -> (20.9612, 15.726)
  arc A0 (20.9612, 15.726) -> (12.1111, 21.5884) centre (4.1775, 0) ccw
  line L4 (12.1111, -21.5884) -> (12.1111, -15)
  line L5 (12.1459, -15) -> (12.1111, -21.5884)
  line L6 (20.9612, -15) -> (20.9612, -15.726) projected
  line L7 (20.9612, -15) -> (20.9612, -15.726)
  arc A1 (12.1111, -21.5884) -> (20.9612, -15.726) centre (4.1775, 0) ccw
  line L8 (12.1111, 15) -> (12.1111, 21.5884) projected
  line L9 (22.5441, 15) -> (20.9612, 15) projected
  arc A2 (12.1111, 15) -> (20.9612, 15) centre (16.5362, 45.9173) ccw
  arc A3 (20.9612, -15) -> (12.1111, -15) centre (16.5362, -33.5759) ccw
  point P0 (0, 0)
ref_plane "Work Plane9" through (0, 0, -15) normal (0, 0, 1) x (1, 0, 0)
sketch "Sketch61" plane through (0, 0, -15) normal (0, 0, 1) x (1, 0, 0)
  line L0 (5.6658, 12.1111) -> (6.5691, 12.1111) projected
  line L1 (6.5691, 12.1111) -> (-0.1843, 12.1111)
  line L2 (5.512, 20.9612) -> (-0.1843, 20.9612)
  line L3 (0, 20.9612) -> (4.8126, 20.9612) projected
  arc A0 (-0.1843, 20.9612) -> (-0.1843, 12.1111) centre (11.2781, 16.5362) ccw
  line L4 (6.5691, 12.1111) -> (6.63, 12.1111) projected
  arc A1 (6.5691, 12.1111) -> (5.512, 20.9612) centre (-21.1275, 13.2908) ccw
  point P0 (0, 0)
ref_plane "Work Plane10" through (0, 0, -15) normal (0, 0, 1) x (1, 0, 0)
sketch "Sketch62" plane through (0, 0, -15) normal (0, 0, 1) x (1, 0, 0)
  line L0 (6.5691, 12.1111) -> (-0.1843, 12.1111)
  line L1 (5.512, 20.9612) -> (-0.1843, 20.9612)
  arc A0 (-0.1843, 20.9612) -> (-0.1843, 12.1111) centre (11.2781, 16.5362) ccw
  line L2 (4.8126, 20.9612) -> (5.512, 20.9612) projected
  arc A1 (5.512, 20.9612) -> (5.3976, 15.5783) centre (27.7821, 17.7954) ccw
  arc A2 (5.3976, 15.5783) -> (6.1482, 13) centre (8.4638, 15.0726) ccw
  line L3 (6.1482, 13) -> (6.5691, 12.1111)
  point P0 (0, 0)
  point P1 (0, 20.9612)
ref_plane "Work Plane12" through (0, 0, 15) normal (0, 0, 1) x (1, 0, 0)
sketch "Sketch65" plane through (0, 0, 15) normal (0, 0, 1) x (1, 0, 0)
  line L0 (0, 12.1111) -> (0, 20.9612)
  line L1 (0, 20.9612) -> (0, 12.1111)
  line L2 (0, 12.1111) -> (5.6659, 12.1111)
  line L3 (0, 12.1111) -> (0, 20.9612) projected
  line L4 (0, 20.9612) -> (4.8105, 20.9612)
  line L5 (0, 20.9612) -> (5.512, 20.9612) projected
  arc A0 (4.8126, 20.9612) -> (4.8105, 16.2544) centre (16.6683, 18.6025) ccw
  arc A1 (4.8105, 16.2544) -> (5.6659, 12.1111) centre (31.8657, 19.6806) ccw
  point P0 (0, 0)
ref_plane "Work Plane11" through (0, 0, 15) normal (0, 0, 1) x (1, 0, 0)
sketch "Sketch67" plane through (0, 0, 15) normal (0, 0, 1) x (1, 0, 0)
  line L0 (0, 12.1111) -> (5.6658, 12.1111)
  line L1 (6.5691, 12.1111) -> (0, 12.1111)
  line L2 (0, 12.1111) -> (0, 20.9612) projected
  line L3 (0, 12.1111) -> (0, 20.9612)
  line L4 (5.512, 20.9612) -> (0, 20.9612)
  arc A0 (5.512, 20.9612) -> (5.3976, 15.5783) centre (27.7821, 17.7954) ccw
  line L5 (6.5691, 12.1111) -> (6.1482, 13)
  arc A1 (5.3976, 15.5783) -> (6.1482, 13) centre (8.4638, 15.0726) ccw
  point P0 (0, 0)
ref_plane "Work Plane15" through (6.63, 0, 0) normal (1, 0, 0) x (0, 0, -1)
sketch "Sketch68" plane through (6.63, 0, 0) normal (1, 0, 0) x (0, 0, -1)
  arc A0 (14, 22) -> (14, 11) centre (62.4766, 16.5) ccw
  arc A1 (14, 11) -> (14, 22) centre (11.848, 16.5) ccw
  arc A2 (14, 10) -> (21.6289, 12) centre (11.8491, 33.7543) ccw
  arc A3 (13, 15) -> (14, 10) centre (21, 14) ccw
  arc A4 (21.6289, 12) -> (13, 15) centre (14.4695, 5.3172) ccw
  arc A5 (-21.5884, 12.1111) -> (-13.1641, 12.1459) centre (-17.4061, 19.3527) ccw
  arc A6 (-13.1641, 12.1459) -> (-21.5884, 12.1111) centre (-17.3607, 8.3588) ccw
  arc A7 (-14.3886, 22) -> (-14.4349, 10.6825) centre (-5.1535, 16.3034) ccw
  arc A8 (-14.4349, 10.6825) -> (-14.3886, 22) centre (-35.9078, 16.429) ccw
  point P0 (0, 0)
sketch "Sketch69" plane through (0, 0, 0) normal (1, 0, 0) x (0, 1, 0)
  arc A0 (-3, -7.5651) -> (11.0179, -2.9788) centre (0.2424, 6.2404) ccw
  line L0 (-3, -7.5651) -> (-3, -6.6289)
  line L1 (11.0179, -2.9788) -> (11.0179, -1.943)
  arc A1 (11.0179, -1.943) -> (10.1452, -2.6581) centre (12.4245, -4.5498) ccw
  arc A2 (-3, -6.6289) -> (10.1452, -2.6581) centre (0.5731, 5.2863) ccw
  line L2 (-8.9035, 0) -> (17, 0) construction
  arc A3 (11.0179, 2.9788) -> (-3, 7.5651) centre (0.2424, -6.2404) ccw
  line L3 (-3, 7.5651) -> (-3, 6.6289)
  line L4 (11.0179, 2.9788) -> (11.0179, 1.943)
  arc A4 (10.1452, 2.6581) -> (11.0179, 1.943) centre (12.4245, 4.5498) ccw
  arc A5 (10.1452, 2.6581) -> (-3, 6.6289) centre (0.5731, -5.2863) ccw
  point P0 (0, 0)
  point P1 (6.0475, -5.8837)
sketch "Sketch70" plane through (0, 0, 0) normal (0, 0, 1) x (1, 0, 0)
  arc A0 (4, -3) -> (7.812, 5.972) centre (-6.9875, 6.9641) ccw
  arc A1 (4, -3) -> (8, -3) centre (6, 0.2231) ccw
  arc A2 (8, -3) -> (7.812, 5.972) centre (-95.4852, -0.6804) ccw
  arc A3 (7.8, 6.0475) -> (6.9938, 11.0179) centre (-4.9894, 6.5238) ccw
  arc A4 (7.8, 6.0475) -> (6.9938, 11.0179) centre (7.8859, 8.612) ccw
  arc A5 (3.0655, -3) -> (5.6658, 12.1111) centre (-16.4907, 8.1445) ccw
  line L0 (3.0655, -3) -> (4, -3) projected
  arc A6 (5.6658, 12.1111) -> (3.0655, -3) centre (0.9123, 5.1498) ccw
sketch "Sketch71" plane through (0, 0, 0) normal (0, 0, 1) x (1, 0, 0)
  line L0 (21.3234, 1.813) -> (-3.8328, 3.9894)
  line L1 (6.7281, 29.5792) -> (31.9548, 41.3881)
  line L2 (2.1762, -23.0341) -> (25, -39)
  line L3 (2.1762, -23.0341) -> (2.3639, -21.5054)
  line L4 (2.3639, -21.5054) -> (3.7434, -22.1348)
  line L5 (3.7434, -22.1348) -> (4.2532, -20)
  line L6 (4.2532, -20) -> (3.0537, -20.1909)
  line L7 (3.0537, -20.1909) -> (3, -18)
  line L8 (3, -18) -> (6, -19)
  line L9 (6, -19) -> (5.7028, -22.6912)
  line L10 (5.7028, -22.6912) -> (25, -36)
  line L11 (25, -39) -> (25, -36)
  line L12 (6.7281, 29.5792) -> (6.7281, 28.625)
  line L13 (6.7281, 28.625) -> (8.2975, 28.625)
  line L14 (8.2975, 28.625) -> (8.7453, 26.5871)
  line L15 (8.7453, 26.5871) -> (6.7281, 26.5871)
  line L16 (6.7281, 26.5871) -> (6.7281, 25.1274)
  line L17 (6.7281, 25.1274) -> (9.7835, 25.1274)
  line L18 (9.7835, 25.1274) -> (9.4996, 29.1021)
  line L19 (9.4996, 29.1021) -> (31.9548, 38.8479)
  line L20 (31.9548, 41.3881) -> (31.9548, 38.8479)
  point P0 (0, 0)
revolve "Revolution4" add sketch "Sketch71" angle 180 mid plane about axis through (21.3234, 1.813, 0) along (-0.9963, 0.0862, 0)
properties part number "cSkull_meso_WOK_tall_VIS"
